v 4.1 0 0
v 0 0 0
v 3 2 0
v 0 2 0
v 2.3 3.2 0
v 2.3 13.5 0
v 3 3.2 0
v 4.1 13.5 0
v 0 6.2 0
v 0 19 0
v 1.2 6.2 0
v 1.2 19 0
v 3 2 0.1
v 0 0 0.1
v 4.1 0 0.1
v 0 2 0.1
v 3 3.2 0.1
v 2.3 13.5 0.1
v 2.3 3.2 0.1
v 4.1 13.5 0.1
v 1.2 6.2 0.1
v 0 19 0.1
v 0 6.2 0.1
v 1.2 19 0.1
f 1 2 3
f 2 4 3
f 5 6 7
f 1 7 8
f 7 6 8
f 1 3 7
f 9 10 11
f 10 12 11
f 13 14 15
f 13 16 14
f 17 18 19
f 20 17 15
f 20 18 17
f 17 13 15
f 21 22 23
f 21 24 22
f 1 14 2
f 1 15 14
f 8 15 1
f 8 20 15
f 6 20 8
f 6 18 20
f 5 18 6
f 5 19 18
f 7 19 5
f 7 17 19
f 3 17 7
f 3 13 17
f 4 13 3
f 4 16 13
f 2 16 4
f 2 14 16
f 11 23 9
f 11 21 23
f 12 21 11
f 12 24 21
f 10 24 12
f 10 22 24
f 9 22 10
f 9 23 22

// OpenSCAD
// file: back_panel_bottom.scad
// ============================================================
// Back Panel - Bottom (large piece, ~250mm tall, includes FPC slot)
// ============================================================
include <common.scad>

module back_panel_bottom() {
    difference() {
        back_panel_full();
        // Cut away top portion
        translate([-1, back_split_y, -1])
            cube([panel_w + 2, panel_h + 2, frame_d + 2]);
        // Groove slots to receive tongues from top piece
        // Cut through full back wall depth (back_thick + margin)
        groove_y = back_split_y - tongue_depth - tol;
        groove_depth = tongue_depth + 2 * tol;
        groove_len = tongue_length + 2 * tol;
        groove_spacing = panel_w / (tongue_count + 1);
        for (i = [1 : tongue_count]) {
            translate([i * groove_spacing - groove_len / 2, groove_y, -0.1])
                cube([groove_len, groove_depth, back_thick + 0.2]);
        }
    }
}

back_panel_bottom();
// file: bezel_bottom.scad
// ============================================================
// Front Bezel - Bottom Side (mitered 45° corners)
// Bottom has large lip (10.3mm) over the display's 11.3mm
// inactive area, with narrow channel (1.2mm) for thin rim.
// Side channels at corners remain open for left/right rims.
// ============================================================
include <common.scad>

module bezel_bottom() {
    bezel_side("bottom");
}

bezel_bottom();
// main file
// ============================================================
// Debug: Panel rim fitting into bottom bezel channel
//
// Shows a 2D cross-section at X = frame_w/2, zoomed to the
// bottom 20mm where the back panel rim sits in the bezel channel.
//
// You should see two pieces side by side:
//   Left:  back panel rim (thin, frame_d tall)
//   Right: bottom bezel (outer wall + channel gap + lip)
//
// The gap between them is channel_tol (0.2mm) on each side.
// ============================================================
include <common.scad>
use <bezel_bottom.scad>
use <back_panel_bottom.scad>

linear_extrude(0.1)
projection(cut = true)
    rotate([0, 90, 0])
        translate([-frame_w / 2, 0, 0])
        intersection() {
            union() {
                // Bottom bezel (frame coordinates)
                bezel_bottom();
                // Back panel (offset into frame coordinates)
                translate([panel_inset, panel_inset, 0])
                    back_panel_bottom();
            }
            // Clip to bottom 20mm to zoom in on the rim/channel area
            translate([-1, -1, -1])
                cube([frame_w + 2, 20, 20]);
        }
